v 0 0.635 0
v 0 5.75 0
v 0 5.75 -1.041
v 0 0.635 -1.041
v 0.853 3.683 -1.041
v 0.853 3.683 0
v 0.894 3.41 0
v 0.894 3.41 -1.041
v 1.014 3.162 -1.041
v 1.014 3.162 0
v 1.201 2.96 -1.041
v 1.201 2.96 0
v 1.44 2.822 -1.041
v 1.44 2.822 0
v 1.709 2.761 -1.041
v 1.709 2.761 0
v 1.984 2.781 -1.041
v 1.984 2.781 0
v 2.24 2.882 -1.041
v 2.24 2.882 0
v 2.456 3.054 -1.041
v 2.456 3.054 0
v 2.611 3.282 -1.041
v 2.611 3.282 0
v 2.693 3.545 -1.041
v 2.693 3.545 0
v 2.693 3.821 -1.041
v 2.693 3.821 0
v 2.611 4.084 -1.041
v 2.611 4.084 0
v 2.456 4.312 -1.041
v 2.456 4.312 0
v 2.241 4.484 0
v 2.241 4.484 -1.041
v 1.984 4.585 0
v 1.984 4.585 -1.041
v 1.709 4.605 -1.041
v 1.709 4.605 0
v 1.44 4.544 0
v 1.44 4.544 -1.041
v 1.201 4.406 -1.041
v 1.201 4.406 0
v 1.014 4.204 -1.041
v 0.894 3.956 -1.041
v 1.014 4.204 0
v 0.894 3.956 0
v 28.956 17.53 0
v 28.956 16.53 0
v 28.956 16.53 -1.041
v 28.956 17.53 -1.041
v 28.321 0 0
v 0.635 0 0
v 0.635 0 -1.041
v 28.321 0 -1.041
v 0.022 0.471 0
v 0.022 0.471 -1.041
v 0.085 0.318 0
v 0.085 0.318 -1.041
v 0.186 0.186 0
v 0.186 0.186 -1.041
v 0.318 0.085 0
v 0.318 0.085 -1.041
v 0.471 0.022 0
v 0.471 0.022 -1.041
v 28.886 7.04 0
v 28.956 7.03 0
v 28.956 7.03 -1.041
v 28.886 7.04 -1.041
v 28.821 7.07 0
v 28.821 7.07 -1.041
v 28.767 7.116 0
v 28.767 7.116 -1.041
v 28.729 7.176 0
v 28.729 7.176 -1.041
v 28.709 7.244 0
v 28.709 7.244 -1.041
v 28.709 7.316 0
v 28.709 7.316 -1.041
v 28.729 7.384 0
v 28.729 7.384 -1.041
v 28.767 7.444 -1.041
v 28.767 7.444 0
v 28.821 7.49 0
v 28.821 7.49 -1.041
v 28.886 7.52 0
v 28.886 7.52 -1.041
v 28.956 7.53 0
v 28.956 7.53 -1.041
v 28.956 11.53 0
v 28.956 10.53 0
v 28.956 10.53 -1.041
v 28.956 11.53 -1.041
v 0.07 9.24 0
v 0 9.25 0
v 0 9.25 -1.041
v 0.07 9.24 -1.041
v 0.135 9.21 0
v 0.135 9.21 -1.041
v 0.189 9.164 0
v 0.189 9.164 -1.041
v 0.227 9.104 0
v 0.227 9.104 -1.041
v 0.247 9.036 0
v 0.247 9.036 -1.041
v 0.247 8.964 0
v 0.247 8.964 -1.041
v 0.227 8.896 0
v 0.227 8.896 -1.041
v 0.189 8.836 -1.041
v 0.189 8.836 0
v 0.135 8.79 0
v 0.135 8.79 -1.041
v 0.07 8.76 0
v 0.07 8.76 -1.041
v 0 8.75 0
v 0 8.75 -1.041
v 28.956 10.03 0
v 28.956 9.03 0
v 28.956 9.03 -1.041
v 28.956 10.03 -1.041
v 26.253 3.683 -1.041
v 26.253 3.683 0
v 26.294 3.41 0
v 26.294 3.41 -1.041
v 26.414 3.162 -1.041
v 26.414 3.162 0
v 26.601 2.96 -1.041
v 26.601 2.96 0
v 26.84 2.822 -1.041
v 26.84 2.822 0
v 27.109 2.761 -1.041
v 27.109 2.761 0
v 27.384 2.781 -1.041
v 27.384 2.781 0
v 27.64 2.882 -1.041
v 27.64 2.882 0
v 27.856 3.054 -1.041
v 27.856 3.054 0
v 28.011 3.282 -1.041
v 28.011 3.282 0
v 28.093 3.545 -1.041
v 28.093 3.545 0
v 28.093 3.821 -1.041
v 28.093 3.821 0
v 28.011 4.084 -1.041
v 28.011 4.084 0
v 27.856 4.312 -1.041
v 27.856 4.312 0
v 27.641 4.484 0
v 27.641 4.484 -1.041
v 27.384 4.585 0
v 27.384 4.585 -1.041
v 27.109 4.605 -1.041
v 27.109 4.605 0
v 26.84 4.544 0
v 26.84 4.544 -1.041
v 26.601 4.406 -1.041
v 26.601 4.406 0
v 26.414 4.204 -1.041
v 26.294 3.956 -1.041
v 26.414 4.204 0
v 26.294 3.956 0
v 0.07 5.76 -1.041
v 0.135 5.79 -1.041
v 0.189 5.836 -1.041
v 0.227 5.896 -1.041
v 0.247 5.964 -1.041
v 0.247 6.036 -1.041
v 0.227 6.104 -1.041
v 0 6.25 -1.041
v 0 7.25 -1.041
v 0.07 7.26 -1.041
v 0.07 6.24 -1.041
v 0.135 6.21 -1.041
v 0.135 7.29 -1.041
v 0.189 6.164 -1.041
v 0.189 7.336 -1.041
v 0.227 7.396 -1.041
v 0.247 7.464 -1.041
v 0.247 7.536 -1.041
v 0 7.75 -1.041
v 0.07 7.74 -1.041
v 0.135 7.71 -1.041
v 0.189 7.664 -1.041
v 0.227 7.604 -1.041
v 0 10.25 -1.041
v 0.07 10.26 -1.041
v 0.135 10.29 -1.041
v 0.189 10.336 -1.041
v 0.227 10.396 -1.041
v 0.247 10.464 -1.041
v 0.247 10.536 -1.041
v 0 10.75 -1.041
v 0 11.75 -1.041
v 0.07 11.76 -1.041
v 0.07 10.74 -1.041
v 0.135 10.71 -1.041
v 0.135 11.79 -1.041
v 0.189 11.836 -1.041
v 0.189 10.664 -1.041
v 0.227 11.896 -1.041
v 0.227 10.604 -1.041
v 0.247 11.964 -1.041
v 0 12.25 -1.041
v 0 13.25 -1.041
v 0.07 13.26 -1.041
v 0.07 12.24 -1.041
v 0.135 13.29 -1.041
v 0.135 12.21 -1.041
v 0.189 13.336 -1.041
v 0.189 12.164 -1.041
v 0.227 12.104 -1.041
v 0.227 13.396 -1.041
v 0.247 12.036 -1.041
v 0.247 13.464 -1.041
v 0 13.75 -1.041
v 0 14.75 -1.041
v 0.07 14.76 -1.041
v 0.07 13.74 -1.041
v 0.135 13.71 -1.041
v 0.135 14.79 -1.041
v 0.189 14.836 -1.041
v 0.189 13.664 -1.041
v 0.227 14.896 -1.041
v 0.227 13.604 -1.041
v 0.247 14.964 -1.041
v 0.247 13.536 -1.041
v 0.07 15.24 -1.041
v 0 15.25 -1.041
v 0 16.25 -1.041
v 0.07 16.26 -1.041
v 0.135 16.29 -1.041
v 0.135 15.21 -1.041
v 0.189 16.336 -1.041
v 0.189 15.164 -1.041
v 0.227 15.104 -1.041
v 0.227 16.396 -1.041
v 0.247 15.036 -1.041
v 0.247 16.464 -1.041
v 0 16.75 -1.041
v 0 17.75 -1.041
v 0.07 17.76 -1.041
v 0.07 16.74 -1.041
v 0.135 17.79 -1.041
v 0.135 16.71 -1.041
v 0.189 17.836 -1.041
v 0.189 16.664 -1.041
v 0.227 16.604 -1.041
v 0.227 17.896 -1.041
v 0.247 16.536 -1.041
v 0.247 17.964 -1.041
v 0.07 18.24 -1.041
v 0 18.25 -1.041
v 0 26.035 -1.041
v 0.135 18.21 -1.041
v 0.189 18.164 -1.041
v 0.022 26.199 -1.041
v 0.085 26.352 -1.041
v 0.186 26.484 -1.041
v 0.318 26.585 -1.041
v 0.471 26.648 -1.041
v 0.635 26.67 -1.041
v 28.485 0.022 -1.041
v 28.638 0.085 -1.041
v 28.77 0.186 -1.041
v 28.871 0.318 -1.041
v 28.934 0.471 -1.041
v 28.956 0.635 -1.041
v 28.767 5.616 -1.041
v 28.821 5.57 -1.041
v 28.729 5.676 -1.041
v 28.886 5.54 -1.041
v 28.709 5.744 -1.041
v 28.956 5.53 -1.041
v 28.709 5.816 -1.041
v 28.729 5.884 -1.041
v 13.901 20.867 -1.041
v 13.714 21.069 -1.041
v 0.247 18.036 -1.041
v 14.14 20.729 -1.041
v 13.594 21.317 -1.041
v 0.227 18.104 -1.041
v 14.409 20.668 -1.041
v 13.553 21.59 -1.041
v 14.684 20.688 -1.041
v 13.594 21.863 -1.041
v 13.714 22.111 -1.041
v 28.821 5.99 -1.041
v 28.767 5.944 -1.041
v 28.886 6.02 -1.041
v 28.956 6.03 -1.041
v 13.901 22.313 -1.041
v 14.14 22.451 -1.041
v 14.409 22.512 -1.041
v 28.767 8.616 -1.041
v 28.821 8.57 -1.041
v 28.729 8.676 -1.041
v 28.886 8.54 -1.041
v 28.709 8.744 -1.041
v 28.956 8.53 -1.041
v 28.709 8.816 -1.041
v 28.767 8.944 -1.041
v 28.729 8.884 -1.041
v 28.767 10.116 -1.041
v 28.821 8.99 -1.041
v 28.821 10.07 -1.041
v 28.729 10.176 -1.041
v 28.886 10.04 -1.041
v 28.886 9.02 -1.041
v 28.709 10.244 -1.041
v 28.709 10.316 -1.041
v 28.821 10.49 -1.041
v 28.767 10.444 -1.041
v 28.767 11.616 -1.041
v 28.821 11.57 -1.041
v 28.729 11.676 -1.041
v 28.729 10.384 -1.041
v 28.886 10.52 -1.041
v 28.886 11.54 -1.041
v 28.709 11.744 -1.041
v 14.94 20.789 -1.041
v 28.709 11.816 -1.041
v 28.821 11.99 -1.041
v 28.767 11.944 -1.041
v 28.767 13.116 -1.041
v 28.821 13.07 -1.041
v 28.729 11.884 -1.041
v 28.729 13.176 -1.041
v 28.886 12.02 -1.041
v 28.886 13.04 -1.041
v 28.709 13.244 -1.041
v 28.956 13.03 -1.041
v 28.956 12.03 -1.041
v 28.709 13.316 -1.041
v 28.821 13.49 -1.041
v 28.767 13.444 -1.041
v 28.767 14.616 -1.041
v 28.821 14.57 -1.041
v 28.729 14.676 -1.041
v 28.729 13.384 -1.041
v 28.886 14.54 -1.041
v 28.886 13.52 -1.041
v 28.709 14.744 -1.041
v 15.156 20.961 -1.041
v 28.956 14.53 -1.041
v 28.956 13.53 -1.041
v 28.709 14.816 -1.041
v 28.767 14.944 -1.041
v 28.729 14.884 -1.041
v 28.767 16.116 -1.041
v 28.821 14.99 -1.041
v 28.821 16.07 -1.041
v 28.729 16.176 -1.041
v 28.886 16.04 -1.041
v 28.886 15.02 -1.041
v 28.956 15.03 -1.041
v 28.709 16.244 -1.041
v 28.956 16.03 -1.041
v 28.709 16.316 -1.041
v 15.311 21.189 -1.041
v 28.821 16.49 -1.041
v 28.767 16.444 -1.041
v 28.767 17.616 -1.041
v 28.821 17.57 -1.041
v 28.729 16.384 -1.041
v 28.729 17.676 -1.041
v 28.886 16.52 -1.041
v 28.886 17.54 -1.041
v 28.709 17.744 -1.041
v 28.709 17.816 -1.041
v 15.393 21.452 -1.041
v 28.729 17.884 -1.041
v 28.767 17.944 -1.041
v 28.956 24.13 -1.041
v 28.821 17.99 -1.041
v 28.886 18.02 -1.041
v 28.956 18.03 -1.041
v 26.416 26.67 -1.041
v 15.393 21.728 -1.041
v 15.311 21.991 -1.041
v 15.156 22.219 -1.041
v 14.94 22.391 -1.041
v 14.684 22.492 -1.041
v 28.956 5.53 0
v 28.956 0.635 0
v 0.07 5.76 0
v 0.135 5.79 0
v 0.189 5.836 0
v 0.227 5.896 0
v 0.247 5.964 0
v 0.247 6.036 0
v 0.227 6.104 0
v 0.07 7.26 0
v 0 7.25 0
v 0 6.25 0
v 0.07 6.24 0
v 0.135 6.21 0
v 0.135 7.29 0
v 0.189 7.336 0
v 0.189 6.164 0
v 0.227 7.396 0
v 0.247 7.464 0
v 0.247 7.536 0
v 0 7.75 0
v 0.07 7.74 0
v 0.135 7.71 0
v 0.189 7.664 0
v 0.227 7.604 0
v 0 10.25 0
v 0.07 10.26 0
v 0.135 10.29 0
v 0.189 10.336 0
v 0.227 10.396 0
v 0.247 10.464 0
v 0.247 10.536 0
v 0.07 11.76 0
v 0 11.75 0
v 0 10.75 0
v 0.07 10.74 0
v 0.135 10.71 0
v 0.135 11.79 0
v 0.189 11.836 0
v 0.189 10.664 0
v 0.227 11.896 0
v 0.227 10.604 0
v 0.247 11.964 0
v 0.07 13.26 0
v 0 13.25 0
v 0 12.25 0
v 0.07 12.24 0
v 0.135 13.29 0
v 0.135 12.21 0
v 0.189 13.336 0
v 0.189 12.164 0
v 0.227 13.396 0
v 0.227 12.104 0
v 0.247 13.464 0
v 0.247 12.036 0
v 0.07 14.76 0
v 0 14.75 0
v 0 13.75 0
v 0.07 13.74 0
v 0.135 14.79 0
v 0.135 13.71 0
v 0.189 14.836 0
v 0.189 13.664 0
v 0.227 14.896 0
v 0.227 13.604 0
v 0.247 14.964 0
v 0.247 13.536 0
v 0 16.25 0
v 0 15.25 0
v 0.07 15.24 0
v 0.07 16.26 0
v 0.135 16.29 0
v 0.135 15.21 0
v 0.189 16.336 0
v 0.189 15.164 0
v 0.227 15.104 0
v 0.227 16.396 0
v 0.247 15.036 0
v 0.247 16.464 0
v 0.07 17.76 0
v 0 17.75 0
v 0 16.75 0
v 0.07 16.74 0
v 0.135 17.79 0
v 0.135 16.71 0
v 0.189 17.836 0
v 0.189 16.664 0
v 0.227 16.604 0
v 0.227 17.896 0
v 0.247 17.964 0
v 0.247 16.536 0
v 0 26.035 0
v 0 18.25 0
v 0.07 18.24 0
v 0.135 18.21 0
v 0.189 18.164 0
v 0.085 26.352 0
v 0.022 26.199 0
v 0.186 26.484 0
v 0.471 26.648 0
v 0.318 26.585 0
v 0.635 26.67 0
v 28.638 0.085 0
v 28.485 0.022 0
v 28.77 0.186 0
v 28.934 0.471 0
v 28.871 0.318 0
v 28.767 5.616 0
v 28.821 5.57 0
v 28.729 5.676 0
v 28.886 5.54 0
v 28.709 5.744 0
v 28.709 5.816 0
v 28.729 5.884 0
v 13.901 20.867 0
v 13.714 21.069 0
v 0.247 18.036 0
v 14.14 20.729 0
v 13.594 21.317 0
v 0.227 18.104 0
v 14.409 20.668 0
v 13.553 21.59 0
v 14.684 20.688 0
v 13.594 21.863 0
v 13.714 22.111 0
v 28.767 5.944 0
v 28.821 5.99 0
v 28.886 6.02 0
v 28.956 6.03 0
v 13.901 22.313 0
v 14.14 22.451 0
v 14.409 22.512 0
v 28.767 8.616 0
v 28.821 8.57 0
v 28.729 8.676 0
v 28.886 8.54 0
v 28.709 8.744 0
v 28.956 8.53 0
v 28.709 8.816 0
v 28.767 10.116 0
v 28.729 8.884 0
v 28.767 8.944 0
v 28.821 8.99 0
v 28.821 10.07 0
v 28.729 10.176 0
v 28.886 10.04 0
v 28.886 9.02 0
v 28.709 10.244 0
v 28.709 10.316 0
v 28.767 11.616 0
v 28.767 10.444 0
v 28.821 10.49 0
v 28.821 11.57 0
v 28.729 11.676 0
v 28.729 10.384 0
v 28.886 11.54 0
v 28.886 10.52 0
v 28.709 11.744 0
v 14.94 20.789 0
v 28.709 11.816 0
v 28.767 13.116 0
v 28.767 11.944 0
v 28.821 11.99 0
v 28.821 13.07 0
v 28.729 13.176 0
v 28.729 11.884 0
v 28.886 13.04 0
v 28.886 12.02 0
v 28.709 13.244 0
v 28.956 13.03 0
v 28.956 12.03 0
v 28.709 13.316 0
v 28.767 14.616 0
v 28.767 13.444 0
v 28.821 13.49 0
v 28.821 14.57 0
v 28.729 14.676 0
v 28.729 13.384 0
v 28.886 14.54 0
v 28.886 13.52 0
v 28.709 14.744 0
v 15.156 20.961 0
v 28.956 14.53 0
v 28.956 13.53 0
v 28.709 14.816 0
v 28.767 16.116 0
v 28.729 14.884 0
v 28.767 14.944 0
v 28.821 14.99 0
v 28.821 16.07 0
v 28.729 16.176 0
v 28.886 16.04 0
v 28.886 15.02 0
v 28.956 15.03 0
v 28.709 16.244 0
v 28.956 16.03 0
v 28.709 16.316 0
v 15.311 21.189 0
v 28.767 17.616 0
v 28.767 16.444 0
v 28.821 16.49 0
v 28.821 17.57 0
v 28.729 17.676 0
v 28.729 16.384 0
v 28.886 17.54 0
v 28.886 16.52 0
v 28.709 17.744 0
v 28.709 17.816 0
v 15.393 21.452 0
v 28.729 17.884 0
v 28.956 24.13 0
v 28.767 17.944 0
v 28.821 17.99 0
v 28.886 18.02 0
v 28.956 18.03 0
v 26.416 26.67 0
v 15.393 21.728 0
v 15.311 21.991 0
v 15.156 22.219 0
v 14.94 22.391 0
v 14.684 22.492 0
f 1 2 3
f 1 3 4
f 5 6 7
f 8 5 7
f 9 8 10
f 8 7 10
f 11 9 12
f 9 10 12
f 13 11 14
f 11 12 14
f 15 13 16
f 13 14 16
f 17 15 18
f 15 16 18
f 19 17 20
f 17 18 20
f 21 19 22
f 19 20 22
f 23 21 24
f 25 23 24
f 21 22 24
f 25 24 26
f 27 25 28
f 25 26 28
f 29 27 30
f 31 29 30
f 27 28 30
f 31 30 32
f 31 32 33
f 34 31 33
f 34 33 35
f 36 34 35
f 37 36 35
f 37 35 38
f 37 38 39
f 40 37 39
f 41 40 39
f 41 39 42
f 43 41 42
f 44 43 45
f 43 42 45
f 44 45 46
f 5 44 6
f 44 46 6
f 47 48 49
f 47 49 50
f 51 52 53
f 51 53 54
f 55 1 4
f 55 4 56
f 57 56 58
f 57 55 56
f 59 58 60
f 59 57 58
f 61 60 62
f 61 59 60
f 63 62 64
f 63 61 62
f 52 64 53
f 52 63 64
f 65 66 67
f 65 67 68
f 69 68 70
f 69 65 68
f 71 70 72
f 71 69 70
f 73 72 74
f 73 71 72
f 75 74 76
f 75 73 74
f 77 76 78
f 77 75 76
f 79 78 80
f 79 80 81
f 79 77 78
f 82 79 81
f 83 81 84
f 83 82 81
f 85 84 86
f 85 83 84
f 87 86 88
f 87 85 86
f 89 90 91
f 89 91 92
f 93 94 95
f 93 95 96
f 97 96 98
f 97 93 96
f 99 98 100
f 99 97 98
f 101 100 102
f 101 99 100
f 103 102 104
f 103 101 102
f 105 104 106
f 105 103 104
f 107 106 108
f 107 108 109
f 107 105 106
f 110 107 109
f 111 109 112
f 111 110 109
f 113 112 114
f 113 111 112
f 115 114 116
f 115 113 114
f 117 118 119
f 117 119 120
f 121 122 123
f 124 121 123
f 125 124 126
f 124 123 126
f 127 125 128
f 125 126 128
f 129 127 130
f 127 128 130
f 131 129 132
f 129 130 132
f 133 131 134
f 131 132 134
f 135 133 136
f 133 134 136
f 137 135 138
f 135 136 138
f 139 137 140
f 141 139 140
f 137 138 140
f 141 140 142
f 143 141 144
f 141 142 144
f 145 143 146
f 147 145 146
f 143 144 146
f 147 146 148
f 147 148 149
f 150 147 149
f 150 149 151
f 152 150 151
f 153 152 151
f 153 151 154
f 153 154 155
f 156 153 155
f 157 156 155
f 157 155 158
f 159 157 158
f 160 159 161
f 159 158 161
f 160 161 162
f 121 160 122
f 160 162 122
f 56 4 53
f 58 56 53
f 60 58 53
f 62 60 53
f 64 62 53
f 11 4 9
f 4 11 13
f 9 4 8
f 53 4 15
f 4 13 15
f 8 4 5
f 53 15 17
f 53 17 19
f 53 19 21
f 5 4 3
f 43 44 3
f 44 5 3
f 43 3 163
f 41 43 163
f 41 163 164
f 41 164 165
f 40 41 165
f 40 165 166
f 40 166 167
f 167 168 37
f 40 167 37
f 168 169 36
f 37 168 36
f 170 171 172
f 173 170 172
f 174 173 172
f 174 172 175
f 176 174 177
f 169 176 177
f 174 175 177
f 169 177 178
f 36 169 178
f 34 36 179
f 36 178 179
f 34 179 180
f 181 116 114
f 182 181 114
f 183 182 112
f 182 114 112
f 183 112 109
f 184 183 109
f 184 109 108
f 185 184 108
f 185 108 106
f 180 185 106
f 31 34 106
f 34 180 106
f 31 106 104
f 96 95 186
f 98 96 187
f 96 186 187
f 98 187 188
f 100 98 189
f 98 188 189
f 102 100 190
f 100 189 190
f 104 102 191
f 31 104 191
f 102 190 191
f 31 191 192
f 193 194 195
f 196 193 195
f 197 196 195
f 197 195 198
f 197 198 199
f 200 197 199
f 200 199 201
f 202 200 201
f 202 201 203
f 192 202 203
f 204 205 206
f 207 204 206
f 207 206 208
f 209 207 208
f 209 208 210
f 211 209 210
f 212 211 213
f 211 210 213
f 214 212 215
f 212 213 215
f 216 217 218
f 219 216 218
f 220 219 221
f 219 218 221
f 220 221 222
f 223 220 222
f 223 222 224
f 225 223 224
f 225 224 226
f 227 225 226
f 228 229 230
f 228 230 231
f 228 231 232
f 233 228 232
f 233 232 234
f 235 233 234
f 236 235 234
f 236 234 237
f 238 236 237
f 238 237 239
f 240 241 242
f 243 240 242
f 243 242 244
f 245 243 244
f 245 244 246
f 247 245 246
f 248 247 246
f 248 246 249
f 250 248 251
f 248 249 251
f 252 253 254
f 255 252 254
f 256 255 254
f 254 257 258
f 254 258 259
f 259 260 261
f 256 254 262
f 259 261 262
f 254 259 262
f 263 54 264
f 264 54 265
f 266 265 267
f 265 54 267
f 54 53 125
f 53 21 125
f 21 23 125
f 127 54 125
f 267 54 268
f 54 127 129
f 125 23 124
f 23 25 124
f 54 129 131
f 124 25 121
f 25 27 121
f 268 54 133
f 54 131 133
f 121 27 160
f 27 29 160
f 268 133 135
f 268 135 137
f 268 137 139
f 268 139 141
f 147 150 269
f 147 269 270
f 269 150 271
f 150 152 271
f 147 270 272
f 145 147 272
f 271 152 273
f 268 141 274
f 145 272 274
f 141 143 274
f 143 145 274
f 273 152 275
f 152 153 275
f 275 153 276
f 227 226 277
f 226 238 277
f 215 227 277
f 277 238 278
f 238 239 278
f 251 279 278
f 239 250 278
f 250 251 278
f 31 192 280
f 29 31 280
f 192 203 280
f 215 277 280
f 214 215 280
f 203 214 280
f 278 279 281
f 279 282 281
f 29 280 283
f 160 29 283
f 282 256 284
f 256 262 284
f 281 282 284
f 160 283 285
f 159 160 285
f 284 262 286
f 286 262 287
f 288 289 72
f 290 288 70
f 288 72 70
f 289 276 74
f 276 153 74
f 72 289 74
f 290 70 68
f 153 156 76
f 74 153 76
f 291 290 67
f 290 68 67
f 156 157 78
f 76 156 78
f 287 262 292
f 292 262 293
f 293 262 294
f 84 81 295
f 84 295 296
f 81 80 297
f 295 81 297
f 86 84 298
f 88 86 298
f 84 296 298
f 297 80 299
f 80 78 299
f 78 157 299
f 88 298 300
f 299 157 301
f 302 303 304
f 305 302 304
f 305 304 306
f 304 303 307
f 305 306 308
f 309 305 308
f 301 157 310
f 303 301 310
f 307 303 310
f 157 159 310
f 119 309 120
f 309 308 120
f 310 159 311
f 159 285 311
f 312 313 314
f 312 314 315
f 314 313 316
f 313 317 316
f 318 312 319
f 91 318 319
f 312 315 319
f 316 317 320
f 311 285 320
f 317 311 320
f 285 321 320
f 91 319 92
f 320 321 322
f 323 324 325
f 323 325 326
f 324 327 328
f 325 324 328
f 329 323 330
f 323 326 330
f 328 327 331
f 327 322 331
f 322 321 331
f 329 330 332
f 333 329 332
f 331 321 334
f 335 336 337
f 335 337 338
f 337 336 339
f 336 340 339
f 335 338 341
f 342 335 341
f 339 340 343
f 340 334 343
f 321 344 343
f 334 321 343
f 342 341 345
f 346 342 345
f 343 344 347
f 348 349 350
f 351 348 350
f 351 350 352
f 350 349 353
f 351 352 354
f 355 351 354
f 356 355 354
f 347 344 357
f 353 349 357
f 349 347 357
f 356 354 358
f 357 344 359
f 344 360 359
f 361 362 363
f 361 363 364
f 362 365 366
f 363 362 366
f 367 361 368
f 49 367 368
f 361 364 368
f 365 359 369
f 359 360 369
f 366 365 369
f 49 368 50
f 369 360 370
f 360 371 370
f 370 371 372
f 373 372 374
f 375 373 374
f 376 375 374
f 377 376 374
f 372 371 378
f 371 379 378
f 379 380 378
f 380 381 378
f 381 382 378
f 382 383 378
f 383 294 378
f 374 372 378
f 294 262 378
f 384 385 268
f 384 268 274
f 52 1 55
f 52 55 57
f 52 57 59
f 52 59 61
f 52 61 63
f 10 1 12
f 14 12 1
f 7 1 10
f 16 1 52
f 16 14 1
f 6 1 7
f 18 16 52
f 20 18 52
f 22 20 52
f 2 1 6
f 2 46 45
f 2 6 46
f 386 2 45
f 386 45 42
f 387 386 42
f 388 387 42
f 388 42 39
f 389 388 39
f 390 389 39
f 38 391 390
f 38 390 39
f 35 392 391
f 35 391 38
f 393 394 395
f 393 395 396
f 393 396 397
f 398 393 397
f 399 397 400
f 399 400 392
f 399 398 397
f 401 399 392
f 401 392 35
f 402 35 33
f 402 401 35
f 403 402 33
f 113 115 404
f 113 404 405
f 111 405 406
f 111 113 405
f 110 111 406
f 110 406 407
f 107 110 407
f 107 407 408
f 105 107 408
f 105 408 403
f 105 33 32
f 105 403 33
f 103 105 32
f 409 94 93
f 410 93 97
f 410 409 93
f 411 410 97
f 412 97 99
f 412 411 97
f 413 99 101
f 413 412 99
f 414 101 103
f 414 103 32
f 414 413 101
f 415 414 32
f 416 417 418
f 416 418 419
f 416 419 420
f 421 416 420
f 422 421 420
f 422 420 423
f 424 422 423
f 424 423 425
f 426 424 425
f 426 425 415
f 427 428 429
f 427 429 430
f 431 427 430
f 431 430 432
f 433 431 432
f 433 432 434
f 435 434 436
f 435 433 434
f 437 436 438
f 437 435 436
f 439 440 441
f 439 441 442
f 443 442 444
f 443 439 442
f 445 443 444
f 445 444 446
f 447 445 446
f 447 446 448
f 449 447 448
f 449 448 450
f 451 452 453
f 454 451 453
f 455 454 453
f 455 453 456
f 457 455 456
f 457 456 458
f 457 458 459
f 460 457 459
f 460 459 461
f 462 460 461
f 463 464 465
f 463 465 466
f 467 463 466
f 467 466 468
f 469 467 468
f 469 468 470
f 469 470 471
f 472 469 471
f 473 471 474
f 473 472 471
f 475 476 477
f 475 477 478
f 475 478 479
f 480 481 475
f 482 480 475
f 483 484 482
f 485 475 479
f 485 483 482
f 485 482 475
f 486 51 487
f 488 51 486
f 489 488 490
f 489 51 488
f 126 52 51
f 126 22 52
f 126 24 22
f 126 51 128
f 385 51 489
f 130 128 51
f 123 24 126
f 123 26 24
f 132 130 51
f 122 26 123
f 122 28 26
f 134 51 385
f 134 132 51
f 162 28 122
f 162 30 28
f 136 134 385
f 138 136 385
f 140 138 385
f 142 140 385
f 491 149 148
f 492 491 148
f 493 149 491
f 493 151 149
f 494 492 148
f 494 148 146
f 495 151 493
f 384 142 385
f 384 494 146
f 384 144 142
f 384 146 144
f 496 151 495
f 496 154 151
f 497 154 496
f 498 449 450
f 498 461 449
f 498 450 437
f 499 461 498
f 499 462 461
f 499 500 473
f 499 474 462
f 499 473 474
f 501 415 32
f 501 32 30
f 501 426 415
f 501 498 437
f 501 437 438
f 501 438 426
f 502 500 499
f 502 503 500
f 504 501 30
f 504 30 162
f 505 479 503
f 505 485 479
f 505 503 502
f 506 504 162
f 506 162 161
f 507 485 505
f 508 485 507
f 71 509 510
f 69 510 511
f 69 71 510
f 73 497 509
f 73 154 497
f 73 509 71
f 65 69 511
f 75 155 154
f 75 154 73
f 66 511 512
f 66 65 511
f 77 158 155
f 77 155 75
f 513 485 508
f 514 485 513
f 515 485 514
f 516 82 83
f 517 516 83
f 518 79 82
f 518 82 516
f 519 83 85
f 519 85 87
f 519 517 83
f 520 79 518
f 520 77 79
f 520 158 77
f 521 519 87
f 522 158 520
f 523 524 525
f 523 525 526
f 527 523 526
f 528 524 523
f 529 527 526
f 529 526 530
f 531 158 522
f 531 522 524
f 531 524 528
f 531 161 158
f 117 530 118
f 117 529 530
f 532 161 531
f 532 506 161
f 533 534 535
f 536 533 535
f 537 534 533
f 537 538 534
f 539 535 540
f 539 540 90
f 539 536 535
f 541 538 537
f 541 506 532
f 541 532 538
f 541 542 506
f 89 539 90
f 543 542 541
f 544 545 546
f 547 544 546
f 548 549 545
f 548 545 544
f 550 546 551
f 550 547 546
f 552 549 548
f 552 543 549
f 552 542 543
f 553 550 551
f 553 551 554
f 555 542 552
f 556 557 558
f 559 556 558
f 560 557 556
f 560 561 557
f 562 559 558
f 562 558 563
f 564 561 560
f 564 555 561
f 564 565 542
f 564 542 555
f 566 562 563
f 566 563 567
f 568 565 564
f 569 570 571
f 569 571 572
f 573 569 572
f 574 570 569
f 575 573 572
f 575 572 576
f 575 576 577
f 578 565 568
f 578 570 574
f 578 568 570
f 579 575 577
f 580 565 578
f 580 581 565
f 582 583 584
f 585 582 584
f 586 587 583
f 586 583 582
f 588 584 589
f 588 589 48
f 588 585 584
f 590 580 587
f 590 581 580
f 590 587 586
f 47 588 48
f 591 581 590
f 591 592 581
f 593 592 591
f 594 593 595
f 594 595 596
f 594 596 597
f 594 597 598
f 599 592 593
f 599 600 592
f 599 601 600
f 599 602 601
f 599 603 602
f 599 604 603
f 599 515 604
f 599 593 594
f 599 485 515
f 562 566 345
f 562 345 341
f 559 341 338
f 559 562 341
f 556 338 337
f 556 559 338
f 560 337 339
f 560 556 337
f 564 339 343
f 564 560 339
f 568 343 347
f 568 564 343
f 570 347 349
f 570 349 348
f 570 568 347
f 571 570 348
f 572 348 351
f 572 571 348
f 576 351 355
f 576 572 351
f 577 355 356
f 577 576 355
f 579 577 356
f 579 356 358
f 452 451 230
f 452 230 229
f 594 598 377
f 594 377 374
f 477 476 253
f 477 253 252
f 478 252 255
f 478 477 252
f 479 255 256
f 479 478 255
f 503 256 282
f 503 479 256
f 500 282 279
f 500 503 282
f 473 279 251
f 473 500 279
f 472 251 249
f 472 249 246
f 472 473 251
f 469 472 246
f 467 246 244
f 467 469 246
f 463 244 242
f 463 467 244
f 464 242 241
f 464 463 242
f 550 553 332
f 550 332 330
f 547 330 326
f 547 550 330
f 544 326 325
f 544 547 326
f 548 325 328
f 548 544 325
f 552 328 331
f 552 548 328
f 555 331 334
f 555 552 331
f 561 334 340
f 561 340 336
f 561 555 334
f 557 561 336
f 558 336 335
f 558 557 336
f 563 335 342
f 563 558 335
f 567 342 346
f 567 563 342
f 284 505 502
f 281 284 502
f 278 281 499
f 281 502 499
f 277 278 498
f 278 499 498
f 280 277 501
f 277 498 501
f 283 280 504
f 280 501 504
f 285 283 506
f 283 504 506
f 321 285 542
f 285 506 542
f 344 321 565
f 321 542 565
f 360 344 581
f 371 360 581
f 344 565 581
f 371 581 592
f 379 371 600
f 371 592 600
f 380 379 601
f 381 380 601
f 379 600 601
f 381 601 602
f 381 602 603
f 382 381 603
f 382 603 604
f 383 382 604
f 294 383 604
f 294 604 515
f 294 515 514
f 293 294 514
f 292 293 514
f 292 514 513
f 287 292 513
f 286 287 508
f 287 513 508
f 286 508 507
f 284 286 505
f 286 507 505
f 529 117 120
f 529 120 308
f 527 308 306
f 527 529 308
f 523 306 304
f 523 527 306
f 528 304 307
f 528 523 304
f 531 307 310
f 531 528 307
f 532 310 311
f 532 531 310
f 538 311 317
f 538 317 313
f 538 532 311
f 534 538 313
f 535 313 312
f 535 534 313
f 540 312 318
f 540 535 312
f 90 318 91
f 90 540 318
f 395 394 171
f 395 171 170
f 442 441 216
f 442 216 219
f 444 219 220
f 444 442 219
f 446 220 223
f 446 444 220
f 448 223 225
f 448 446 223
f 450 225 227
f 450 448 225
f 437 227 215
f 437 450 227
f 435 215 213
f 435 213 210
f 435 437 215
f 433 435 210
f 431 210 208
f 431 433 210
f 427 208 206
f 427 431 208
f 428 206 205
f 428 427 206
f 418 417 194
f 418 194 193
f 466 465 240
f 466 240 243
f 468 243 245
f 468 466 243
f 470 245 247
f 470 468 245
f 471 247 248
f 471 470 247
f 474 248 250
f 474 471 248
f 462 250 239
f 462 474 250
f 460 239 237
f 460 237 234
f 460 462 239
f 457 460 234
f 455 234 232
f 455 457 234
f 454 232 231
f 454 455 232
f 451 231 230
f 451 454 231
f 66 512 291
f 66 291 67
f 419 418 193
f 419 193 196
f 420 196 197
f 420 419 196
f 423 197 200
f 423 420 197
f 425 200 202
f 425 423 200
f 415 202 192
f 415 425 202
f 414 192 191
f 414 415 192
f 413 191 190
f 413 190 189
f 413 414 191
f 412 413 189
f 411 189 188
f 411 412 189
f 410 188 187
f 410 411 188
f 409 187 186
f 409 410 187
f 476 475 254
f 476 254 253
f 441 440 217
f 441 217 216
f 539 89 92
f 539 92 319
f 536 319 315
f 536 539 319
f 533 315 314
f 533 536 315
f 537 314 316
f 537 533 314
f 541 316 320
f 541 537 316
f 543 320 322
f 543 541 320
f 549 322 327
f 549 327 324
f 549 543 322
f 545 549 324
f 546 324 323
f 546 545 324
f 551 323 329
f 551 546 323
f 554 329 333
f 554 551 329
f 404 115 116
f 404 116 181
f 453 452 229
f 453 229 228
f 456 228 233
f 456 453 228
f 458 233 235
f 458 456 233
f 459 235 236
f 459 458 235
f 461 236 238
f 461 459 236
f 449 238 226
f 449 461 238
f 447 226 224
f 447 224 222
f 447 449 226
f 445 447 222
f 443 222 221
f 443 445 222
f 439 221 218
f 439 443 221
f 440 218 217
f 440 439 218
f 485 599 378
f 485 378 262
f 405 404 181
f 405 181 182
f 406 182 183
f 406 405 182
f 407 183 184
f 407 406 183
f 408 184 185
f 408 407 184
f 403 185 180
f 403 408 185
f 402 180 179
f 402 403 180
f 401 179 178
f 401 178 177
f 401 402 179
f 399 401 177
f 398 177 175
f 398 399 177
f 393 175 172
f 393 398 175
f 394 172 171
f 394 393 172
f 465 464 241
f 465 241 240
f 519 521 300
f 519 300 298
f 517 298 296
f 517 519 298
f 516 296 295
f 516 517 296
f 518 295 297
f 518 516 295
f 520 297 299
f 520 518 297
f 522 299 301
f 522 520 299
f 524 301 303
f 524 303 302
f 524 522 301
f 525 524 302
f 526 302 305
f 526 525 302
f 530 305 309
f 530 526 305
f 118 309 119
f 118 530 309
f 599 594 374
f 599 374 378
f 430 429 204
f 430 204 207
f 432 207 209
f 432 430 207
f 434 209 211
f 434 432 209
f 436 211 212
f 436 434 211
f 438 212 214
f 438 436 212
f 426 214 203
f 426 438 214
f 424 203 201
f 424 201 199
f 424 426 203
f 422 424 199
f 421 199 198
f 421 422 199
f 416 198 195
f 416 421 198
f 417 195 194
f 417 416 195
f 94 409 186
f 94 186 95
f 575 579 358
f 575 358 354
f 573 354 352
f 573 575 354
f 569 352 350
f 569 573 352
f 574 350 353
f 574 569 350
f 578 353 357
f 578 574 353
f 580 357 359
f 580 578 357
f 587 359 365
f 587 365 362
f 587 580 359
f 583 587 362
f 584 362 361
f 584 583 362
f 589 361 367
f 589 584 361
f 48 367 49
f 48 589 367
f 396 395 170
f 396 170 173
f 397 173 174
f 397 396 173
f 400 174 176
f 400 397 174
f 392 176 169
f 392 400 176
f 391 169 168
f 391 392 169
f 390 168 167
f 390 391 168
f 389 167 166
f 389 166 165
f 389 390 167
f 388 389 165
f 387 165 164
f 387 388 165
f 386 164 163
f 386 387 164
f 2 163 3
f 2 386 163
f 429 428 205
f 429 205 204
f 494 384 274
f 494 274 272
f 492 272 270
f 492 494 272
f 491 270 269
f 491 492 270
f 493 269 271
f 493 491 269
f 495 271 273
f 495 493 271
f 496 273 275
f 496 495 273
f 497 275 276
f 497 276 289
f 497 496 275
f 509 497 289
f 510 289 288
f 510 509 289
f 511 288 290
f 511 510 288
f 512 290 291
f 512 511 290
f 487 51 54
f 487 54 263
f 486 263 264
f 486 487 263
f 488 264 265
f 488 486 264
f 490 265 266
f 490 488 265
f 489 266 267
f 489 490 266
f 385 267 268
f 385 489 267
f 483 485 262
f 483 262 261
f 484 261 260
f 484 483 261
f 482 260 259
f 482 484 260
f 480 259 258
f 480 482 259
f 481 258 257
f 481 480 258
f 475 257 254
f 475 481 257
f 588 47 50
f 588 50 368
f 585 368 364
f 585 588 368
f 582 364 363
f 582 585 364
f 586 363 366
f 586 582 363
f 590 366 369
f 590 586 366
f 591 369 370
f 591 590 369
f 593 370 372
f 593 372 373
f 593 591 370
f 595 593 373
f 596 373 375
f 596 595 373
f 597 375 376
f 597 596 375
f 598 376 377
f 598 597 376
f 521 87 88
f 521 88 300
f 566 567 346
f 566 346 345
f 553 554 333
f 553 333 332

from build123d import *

# Parameters (mm, degrees)
SKETCH1_R           = 0.925
SKETCH1_R_2         = 0.92499942
BOSS_EXTRUDE1_DEPTH = 1.041


with BuildPart() as part:
    # Sketch1 → Boss-Extrude1 (new body)
    with BuildSketch(Plane.XY):
        with BuildLine():
            Line((0, 5.75), (0, 0.635))
            ThreePointArc((0, 0.635), (0.185987194, 0.185987194), (0.635, 0))
            Line((0.635, 0), (28.321, 0))
            ThreePointArc((28.321, 0), (28.770012806, 0.185987194), (28.956, 0.635))
            Line((28.956, 0.635), (28.956, 5.53000114))
            ThreePointArc((28.956, 5.53000114), (28.706, 5.78000114), (28.956, 6.03000114))
            Line((28.956, 6.03000114), (28.956, 7.03000114))
            ThreePointArc((28.956, 7.03000114), (28.706, 7.28000114), (28.956, 7.53000114))
            Line((28.956, 7.53000114), (28.956, 8.53000114))
            ThreePointArc((28.956, 8.53000114), (28.706, 8.78000114), (28.956, 9.03000114))
            Line((28.956, 9.03000114), (28.956, 10.03000114))
            ThreePointArc((28.956, 10.03000114), (28.706, 10.28000114), (28.956, 10.53000114))
            Line((28.956, 10.53000114), (28.956, 11.53000114))
            ThreePointArc((28.956, 11.53000114), (28.706, 11.78000114), (28.956, 12.03000114))
            Line((28.956, 12.03000114), (28.956, 13.03000114))
            ThreePointArc((28.956, 13.03000114), (28.706, 13.28000114), (28.956, 13.53000114))
            Line((28.956, 13.53000114), (28.956, 14.53000114))
            ThreePointArc((28.956, 14.53000114), (28.706, 14.78000114), (28.956, 15.03000114))
            Line((28.956, 15.03000114), (28.956, 16.03000114))
            ThreePointArc((28.956, 16.03000114), (28.706, 16.28000114), (28.956, 16.53000114))
            Line((28.956, 16.53000114), (28.956, 17.53000114))
            ThreePointArc((28.956, 17.53000114), (28.706, 17.78000114), (28.956, 18.03000114))
            Line((28.956, 18.03000114), (28.956, 24.13))
            Line((28.956, 24.13), (26.416, 26.67))
            Line((26.416, 26.67), (0.635, 26.67))
            ThreePointArc((0.635, 26.67), (0.185987194, 26.484012806), (0, 26.035))
            Line((0, 26.035), (0, 18.25))
            ThreePointArc((0, 18.25), (0.25, 18), (0, 17.75))
            Line((0, 17.75), (0, 16.75))
            ThreePointArc((0, 16.75), (0.25, 16.5), (0, 16.25))
            Line((0, 16.25), (0, 15.25))
            ThreePointArc((0, 15.25), (0.25, 15), (0, 14.75))
            Line((0, 14.75), (0, 13.75))
            ThreePointArc((0, 13.75), (0.25, 13.5), (0, 13.25))
            Line((0, 13.25), (0, 12.25))
            ThreePointArc((0, 12.25), (0.25, 12), (0, 11.75))
            Line((0, 11.75), (0, 10.75))
            ThreePointArc((0, 10.75), (0.25, 10.5), (0, 10.25))
            Line((0, 10.25), (0, 9.25))
            ThreePointArc((0, 9.25), (0.25, 9), (0, 8.75))
            Line((0, 8.75), (0, 7.75))
            ThreePointArc((0, 7.75), (0.25, 7.5), (0, 7.25))
            Line((0, 7.25), (0, 6.25))
            ThreePointArc((0, 6.25), (0.25, 6), (0, 5.75))
        make_face()
        with Locations(Location((27.178, 3.683, 0), (0, 0, 180))):
            Circle(SKETCH1_R, mode=Mode.SUBTRACT)
        with Locations(Location((1.778, 3.683, 0), (0, 0, 180))):
            Circle(SKETCH1_R, mode=Mode.SUBTRACT)
        with Locations(Location((14.478, 21.59, 0), (0, 0, 180))):
            Circle(SKETCH1_R_2, mode=Mode.SUBTRACT)
    extrude(amount=-BOSS_EXTRUDE1_DEPTH)


solid = part.part
